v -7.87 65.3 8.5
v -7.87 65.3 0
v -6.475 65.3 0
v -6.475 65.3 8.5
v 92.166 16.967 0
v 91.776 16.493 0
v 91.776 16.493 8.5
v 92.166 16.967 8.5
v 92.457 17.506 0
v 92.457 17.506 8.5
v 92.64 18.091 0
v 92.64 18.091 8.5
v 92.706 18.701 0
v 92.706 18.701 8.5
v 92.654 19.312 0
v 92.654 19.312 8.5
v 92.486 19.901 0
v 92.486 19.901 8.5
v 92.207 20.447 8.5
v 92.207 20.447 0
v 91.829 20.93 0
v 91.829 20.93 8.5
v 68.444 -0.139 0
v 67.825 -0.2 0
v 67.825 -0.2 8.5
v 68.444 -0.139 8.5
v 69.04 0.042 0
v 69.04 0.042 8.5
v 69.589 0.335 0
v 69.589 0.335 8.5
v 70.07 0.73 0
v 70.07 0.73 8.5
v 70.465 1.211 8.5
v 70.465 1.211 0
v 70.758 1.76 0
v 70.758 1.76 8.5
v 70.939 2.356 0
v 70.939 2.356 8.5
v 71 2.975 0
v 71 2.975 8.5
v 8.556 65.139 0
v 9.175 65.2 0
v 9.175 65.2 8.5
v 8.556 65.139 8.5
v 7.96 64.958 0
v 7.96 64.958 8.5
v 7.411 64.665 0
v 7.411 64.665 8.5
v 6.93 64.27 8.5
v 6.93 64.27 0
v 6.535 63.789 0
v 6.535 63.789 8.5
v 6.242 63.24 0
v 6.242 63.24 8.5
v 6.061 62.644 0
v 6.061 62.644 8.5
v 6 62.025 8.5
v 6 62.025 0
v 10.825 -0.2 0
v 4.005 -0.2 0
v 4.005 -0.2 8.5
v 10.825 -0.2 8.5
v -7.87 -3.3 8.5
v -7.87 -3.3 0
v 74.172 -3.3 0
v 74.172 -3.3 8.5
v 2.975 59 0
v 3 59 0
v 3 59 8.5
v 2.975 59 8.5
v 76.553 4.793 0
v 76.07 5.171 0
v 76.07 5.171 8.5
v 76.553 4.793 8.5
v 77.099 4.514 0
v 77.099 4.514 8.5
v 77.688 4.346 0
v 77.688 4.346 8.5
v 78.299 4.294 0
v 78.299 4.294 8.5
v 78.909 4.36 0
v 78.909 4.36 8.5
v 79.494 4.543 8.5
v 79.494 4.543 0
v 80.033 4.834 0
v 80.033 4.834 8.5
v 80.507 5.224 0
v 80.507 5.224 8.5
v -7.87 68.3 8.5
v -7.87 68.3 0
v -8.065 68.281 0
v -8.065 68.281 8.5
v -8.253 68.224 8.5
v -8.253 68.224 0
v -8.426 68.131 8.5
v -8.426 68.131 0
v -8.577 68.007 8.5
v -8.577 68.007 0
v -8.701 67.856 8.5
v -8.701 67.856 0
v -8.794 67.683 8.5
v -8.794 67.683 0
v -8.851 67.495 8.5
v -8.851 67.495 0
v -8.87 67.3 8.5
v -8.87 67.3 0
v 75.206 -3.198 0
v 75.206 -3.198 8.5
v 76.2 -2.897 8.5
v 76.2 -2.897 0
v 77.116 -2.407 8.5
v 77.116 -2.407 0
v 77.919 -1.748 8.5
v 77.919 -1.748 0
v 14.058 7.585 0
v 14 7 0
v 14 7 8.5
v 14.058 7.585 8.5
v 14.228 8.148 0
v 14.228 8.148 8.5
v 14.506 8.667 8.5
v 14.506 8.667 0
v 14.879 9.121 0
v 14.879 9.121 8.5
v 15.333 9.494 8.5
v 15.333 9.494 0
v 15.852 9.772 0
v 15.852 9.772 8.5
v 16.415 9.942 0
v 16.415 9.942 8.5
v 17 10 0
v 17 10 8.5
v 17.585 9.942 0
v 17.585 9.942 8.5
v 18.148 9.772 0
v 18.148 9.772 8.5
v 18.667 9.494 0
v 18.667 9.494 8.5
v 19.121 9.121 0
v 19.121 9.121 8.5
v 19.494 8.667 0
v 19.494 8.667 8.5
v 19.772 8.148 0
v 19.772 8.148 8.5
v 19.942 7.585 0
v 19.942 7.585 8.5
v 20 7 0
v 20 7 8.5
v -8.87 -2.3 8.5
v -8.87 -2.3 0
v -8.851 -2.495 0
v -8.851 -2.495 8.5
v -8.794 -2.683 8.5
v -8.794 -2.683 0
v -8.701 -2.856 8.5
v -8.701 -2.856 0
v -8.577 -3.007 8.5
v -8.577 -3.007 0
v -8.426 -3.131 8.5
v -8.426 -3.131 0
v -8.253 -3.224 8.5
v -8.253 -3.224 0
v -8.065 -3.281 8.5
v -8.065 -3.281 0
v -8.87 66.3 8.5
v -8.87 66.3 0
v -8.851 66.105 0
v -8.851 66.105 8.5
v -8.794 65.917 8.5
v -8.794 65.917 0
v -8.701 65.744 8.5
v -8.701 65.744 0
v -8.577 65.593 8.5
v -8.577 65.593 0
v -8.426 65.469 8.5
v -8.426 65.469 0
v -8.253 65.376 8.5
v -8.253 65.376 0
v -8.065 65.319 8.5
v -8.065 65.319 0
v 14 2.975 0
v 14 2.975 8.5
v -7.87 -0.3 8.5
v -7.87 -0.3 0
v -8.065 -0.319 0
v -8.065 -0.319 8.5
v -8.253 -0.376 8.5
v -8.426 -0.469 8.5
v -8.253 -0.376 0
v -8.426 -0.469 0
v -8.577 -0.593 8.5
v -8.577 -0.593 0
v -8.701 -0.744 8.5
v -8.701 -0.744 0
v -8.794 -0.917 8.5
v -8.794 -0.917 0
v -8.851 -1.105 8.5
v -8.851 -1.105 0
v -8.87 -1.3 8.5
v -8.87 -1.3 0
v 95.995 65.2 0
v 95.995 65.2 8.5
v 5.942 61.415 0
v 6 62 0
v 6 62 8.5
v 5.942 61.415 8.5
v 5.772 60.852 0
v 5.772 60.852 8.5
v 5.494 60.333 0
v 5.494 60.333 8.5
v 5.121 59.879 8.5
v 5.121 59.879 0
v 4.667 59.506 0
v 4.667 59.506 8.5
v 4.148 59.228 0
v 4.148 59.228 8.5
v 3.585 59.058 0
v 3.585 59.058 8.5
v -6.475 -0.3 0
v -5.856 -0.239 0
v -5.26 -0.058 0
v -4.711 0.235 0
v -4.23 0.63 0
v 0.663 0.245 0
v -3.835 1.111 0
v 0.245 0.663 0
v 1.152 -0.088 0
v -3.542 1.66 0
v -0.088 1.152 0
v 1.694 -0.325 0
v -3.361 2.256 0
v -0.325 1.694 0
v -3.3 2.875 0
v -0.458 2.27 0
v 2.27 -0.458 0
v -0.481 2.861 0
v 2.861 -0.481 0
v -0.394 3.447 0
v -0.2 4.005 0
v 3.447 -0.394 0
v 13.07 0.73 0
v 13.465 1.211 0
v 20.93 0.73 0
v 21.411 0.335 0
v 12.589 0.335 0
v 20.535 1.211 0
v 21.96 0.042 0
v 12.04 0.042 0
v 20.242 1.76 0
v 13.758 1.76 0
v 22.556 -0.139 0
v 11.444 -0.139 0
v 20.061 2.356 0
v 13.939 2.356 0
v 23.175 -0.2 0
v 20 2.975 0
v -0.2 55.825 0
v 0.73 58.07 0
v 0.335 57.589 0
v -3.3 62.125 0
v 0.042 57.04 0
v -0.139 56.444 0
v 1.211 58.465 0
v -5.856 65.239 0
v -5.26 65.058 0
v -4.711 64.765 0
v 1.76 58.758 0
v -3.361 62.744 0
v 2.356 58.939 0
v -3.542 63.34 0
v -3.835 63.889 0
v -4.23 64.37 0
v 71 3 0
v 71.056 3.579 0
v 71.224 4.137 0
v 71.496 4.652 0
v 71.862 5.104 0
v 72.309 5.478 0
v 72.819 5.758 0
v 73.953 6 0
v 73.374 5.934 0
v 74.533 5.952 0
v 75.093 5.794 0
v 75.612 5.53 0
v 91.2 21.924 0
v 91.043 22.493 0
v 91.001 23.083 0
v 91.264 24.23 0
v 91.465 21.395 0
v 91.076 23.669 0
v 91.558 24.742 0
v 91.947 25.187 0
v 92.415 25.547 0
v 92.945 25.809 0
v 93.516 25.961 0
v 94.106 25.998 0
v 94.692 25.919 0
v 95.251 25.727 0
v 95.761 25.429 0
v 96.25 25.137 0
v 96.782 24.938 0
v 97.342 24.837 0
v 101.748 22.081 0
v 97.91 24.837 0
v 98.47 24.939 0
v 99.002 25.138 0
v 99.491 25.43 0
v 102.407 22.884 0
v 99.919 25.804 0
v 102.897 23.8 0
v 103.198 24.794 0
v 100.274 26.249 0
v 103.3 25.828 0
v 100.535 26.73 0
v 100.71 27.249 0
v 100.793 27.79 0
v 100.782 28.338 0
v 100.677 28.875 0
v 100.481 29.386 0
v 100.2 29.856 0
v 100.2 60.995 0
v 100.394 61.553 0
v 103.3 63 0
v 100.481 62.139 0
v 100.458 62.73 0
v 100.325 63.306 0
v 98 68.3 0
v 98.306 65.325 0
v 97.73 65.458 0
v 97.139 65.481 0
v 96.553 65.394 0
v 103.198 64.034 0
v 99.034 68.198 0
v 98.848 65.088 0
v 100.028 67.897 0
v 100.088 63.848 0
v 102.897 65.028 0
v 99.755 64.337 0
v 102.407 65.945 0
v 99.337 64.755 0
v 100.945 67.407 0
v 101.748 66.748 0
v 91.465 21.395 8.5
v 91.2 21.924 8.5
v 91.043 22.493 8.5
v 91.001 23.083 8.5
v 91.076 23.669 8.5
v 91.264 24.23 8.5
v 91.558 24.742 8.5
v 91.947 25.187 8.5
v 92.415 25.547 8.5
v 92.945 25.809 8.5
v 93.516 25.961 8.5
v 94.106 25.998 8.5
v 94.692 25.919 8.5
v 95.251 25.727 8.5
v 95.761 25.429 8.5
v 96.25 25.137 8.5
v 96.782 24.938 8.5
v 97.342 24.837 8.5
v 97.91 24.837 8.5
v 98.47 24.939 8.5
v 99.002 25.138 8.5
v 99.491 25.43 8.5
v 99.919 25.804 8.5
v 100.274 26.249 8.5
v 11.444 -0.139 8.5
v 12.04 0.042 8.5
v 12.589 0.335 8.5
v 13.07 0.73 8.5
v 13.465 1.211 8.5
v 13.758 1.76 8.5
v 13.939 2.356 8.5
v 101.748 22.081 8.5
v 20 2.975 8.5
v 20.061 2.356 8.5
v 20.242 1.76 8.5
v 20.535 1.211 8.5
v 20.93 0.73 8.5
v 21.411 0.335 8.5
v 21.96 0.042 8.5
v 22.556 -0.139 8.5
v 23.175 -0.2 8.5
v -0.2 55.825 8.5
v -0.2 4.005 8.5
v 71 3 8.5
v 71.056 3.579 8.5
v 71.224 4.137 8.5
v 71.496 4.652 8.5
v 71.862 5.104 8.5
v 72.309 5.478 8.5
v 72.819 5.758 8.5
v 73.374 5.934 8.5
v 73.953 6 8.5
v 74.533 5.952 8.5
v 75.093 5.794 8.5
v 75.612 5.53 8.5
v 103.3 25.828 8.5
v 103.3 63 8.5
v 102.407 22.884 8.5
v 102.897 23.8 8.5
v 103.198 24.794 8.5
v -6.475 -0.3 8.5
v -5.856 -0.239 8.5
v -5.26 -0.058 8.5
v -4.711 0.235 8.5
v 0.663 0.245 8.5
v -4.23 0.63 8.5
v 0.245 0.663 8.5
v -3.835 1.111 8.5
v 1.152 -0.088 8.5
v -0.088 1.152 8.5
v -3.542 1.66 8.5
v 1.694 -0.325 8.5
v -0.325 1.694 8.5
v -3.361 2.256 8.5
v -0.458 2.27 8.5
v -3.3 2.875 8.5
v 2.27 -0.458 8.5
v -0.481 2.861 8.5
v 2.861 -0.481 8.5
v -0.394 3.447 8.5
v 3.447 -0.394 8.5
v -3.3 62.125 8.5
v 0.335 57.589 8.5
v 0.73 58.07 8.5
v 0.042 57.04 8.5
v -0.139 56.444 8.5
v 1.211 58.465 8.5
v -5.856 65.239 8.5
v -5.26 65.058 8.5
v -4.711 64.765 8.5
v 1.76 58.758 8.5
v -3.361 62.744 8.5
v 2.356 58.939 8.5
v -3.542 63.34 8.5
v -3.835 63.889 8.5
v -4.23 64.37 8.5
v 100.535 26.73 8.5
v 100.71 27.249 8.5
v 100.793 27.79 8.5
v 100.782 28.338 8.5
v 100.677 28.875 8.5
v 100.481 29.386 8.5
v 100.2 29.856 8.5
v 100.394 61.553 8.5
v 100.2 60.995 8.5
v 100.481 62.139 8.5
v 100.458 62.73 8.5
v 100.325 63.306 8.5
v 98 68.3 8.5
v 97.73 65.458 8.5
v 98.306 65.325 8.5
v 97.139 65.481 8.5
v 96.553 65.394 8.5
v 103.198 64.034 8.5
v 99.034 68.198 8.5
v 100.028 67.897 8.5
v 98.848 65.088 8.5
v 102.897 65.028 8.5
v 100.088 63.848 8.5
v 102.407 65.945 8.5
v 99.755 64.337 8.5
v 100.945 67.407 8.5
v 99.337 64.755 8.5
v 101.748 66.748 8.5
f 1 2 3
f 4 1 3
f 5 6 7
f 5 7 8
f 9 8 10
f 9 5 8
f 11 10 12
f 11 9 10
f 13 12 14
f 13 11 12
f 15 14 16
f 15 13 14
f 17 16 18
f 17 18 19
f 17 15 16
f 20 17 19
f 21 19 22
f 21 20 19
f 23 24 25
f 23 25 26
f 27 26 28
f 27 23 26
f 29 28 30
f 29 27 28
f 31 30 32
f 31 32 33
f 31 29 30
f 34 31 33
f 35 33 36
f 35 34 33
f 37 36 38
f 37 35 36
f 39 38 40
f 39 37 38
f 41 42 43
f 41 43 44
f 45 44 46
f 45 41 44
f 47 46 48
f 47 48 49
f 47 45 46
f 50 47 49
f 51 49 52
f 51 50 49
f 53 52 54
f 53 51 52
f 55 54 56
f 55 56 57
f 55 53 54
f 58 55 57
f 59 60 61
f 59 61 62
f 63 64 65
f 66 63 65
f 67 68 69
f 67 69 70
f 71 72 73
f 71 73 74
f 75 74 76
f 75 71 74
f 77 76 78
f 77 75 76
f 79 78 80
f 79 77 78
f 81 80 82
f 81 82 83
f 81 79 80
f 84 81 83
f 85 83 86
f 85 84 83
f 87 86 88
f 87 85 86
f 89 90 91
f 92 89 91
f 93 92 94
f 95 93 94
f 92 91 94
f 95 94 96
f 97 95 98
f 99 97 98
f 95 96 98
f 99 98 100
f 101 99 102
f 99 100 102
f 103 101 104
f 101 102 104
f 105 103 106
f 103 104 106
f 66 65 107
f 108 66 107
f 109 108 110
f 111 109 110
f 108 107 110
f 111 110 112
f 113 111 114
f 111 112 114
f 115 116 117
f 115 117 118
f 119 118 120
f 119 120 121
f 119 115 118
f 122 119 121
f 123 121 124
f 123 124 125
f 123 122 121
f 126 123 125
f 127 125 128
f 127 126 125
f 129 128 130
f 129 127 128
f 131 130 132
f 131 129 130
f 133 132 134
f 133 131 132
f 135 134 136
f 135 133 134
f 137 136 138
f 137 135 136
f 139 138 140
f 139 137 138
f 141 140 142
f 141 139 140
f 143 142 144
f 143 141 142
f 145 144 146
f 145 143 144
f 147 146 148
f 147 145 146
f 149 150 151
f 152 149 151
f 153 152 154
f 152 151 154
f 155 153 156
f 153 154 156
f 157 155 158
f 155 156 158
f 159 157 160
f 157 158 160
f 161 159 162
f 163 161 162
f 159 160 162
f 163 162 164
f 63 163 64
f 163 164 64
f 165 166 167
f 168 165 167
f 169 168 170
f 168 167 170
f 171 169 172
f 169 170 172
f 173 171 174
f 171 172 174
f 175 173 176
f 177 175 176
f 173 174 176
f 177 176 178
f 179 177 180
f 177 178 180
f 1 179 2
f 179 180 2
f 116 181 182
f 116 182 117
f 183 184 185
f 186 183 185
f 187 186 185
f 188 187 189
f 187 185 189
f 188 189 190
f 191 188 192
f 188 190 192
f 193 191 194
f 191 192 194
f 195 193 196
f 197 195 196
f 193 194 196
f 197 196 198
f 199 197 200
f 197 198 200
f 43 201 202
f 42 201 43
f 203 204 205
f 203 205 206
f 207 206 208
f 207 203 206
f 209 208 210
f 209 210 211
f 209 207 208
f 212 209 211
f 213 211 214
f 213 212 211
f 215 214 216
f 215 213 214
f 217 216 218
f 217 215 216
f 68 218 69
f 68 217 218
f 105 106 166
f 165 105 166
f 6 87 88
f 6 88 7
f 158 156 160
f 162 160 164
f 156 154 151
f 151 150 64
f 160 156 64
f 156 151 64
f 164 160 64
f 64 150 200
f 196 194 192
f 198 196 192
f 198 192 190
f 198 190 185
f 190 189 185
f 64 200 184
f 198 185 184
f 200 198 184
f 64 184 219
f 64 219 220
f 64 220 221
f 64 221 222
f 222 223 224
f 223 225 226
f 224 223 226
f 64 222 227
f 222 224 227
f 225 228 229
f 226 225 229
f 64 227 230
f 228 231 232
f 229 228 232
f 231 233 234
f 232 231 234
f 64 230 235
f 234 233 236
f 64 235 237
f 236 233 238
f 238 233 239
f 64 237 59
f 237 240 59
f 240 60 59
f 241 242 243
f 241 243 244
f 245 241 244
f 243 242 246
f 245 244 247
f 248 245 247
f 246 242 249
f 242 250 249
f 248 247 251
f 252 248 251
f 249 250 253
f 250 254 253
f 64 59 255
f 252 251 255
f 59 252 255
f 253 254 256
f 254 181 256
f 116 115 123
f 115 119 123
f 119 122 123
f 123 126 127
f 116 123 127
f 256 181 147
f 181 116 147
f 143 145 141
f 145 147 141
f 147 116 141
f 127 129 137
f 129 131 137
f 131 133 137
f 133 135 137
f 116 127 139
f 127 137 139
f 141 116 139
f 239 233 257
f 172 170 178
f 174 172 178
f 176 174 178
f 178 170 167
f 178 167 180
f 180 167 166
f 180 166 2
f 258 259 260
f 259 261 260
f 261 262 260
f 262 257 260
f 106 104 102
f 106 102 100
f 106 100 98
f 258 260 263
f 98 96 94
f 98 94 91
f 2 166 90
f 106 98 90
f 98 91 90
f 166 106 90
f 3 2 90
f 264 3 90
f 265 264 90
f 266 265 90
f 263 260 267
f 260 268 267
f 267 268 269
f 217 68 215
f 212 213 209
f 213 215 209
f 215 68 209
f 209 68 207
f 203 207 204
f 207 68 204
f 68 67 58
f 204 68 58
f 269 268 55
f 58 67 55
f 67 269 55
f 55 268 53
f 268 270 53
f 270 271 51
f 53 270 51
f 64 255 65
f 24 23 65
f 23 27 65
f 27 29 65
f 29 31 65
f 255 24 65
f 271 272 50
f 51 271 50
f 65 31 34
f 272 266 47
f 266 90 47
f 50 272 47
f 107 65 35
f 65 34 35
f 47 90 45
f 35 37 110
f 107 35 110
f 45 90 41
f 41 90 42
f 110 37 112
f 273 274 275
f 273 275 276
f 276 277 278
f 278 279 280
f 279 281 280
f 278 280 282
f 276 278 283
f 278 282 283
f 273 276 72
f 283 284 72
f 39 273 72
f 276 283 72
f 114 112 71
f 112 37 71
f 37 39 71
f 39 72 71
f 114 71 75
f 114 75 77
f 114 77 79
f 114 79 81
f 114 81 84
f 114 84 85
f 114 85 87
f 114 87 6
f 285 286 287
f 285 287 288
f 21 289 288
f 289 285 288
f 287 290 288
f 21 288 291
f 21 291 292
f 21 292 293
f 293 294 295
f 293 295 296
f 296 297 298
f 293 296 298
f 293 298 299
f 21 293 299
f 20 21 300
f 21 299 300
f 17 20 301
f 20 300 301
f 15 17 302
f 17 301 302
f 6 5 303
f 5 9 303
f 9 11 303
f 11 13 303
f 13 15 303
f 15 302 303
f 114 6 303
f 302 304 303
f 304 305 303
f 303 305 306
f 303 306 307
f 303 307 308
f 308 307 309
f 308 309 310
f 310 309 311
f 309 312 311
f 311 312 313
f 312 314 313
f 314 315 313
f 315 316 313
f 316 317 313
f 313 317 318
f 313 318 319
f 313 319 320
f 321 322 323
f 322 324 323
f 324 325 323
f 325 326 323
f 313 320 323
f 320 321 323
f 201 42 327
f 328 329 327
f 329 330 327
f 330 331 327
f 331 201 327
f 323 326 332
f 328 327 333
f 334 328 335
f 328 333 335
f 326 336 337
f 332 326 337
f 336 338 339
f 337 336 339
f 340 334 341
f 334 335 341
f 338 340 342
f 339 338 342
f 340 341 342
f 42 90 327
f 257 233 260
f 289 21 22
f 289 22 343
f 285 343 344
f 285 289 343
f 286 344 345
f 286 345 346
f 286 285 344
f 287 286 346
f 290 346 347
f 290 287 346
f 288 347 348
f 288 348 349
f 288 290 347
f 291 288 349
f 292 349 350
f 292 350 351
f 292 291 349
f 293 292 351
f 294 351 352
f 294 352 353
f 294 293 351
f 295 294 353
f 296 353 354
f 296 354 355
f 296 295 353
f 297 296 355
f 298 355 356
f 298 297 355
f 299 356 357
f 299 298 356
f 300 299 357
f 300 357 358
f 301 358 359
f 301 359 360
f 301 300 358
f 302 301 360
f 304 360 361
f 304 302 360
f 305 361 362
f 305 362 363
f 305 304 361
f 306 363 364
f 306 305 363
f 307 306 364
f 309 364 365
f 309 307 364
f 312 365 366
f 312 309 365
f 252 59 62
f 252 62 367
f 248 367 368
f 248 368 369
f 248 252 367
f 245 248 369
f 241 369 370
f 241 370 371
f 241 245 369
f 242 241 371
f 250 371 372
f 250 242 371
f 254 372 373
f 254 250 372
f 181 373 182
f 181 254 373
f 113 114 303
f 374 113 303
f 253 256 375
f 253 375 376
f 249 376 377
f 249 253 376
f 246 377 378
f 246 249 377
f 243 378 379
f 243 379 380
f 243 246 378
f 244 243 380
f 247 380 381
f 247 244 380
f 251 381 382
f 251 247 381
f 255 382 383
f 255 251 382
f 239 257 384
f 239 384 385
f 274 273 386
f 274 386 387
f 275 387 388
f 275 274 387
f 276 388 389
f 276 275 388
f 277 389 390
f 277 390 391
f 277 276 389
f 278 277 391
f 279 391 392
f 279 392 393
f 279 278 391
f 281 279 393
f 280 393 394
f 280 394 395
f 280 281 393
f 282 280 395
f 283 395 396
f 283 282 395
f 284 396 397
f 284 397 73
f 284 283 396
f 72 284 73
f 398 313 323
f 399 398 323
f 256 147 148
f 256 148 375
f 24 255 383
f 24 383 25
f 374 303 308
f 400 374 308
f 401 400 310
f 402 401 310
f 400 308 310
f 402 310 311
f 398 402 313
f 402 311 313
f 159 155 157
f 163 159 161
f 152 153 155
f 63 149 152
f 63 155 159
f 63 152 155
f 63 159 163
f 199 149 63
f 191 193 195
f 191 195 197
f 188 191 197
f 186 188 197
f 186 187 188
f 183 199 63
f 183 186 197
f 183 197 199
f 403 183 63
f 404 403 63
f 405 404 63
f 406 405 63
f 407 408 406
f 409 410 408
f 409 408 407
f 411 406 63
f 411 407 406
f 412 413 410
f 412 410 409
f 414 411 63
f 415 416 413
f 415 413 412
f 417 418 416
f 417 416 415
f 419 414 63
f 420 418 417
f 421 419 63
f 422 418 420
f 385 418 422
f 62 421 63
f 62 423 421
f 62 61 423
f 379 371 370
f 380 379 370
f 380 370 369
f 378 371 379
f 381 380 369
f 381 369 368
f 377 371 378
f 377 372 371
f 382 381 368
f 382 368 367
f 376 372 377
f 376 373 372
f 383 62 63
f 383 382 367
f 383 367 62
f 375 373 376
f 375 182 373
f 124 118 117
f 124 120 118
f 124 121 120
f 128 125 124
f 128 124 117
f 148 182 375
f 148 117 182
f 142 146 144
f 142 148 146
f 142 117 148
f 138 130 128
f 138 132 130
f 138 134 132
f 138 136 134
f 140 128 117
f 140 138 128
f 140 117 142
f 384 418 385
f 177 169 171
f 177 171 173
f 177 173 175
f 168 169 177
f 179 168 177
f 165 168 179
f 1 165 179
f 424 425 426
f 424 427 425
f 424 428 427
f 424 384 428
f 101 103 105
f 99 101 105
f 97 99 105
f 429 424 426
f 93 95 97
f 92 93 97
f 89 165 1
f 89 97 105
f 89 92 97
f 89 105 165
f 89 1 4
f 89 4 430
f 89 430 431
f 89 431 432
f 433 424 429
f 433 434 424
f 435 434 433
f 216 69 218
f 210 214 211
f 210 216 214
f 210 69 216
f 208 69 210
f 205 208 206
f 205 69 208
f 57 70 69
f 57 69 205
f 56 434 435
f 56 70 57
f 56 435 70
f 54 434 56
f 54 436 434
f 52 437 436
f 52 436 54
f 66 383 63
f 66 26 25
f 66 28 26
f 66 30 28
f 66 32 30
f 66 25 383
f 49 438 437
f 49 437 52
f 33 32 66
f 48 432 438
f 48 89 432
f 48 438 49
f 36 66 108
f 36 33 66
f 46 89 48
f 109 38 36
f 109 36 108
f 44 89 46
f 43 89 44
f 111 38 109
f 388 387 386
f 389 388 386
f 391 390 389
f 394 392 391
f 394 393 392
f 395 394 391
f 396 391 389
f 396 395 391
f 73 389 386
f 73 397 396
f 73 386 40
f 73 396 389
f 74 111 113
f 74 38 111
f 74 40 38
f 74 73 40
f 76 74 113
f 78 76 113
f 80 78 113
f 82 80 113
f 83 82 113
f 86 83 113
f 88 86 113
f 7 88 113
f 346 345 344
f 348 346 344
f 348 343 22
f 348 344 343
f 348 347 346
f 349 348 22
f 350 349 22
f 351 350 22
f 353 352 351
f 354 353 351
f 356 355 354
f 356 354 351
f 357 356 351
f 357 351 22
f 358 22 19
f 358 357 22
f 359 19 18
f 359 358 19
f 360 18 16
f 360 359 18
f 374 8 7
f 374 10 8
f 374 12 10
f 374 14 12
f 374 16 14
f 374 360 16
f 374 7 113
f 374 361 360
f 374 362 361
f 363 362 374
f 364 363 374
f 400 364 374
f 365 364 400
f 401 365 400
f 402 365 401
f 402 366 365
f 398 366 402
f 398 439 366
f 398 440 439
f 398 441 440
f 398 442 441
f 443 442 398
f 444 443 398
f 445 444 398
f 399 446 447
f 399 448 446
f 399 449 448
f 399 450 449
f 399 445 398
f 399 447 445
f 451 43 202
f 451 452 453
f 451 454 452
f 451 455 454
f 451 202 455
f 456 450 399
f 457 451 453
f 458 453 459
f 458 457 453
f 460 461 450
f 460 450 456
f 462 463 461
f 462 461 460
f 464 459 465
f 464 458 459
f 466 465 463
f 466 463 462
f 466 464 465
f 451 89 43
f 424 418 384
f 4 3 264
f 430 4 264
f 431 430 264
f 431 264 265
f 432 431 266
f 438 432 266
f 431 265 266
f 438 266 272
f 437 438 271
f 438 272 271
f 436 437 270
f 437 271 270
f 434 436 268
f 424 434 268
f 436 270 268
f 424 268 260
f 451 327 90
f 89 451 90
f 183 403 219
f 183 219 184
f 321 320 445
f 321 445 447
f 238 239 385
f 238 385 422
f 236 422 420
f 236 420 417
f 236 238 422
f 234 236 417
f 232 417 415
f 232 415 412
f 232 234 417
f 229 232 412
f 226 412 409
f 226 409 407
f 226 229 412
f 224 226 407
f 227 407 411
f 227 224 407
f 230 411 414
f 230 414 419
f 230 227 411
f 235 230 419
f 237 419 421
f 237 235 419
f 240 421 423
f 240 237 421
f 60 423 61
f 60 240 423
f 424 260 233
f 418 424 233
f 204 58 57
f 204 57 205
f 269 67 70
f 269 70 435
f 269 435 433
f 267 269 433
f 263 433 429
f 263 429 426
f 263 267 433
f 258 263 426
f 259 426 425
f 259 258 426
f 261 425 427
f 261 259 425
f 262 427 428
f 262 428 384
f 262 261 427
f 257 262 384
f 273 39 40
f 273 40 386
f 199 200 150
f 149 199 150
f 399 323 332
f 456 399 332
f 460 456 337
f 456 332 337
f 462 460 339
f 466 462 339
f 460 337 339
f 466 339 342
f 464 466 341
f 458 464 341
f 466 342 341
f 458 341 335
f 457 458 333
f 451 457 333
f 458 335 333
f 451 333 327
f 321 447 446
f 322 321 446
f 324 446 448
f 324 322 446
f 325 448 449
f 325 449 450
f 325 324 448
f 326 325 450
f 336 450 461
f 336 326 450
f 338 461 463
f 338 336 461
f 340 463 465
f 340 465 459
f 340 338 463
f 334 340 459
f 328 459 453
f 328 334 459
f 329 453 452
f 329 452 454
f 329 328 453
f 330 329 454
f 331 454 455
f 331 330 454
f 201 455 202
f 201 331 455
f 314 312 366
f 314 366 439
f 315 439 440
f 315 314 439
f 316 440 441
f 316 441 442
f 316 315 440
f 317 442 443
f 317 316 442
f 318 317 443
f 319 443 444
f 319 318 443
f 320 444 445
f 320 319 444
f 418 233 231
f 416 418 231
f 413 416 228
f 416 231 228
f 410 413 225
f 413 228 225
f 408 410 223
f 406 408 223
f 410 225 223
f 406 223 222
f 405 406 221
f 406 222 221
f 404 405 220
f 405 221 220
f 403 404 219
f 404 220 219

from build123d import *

# Parameters (mm, degrees)
BOSS_EXTRUDE1_DEPTH = 8.5


with BuildPart() as part:
    # Sketch1 → Boss-Extrude1 (new body)
    with BuildSketch(Plane.XY):
        with BuildLine():
            Line((-8.87, -1.3), (-8.87, -2.3))
            ThreePointArc((-8.87, -2.3), (-8.577106781, -3.007106781), (-7.87, -3.3))
            Line((-7.87, -3.3), (74.171572667, -3.3))
            ThreePointArc((74.171572667, -3.3), (76.199795144, -2.896561433), (77.919239112, -1.747665644))
            Line((77.919239112, -1.747665644), (101.747665711, 22.080760955))
            ThreePointArc((101.747665711, 22.080760955), (102.896561433, 23.800204856), (103.3, 25.828427238))
            Line((103.3, 25.828427238), (103.3, 63))
            ThreePointArc((103.3, 63), (101.74766594, 66.74766594), (98, 68.3))
            Line((98, 68.3), (-7.87, 68.3))
            ThreePointArc((-7.87, 68.3), (-8.577106781, 68.007106781), (-8.87, 67.3))
            Line((-8.87, 67.3), (-8.87, 66.3))
            ThreePointArc((-8.87, 66.3), (-8.577106781, 65.592893219), (-7.87, 65.3))
            Line((-7.87, 65.3), (-6.475, 65.3))
            ThreePointArc((-6.475, 65.3), (-4.22993597, 64.37006403), (-3.3, 62.125))
            Line((-3.3, 62.125), (-3.3, 2.875))
            ThreePointArc((-3.3, 2.875), (-4.22993597, 0.62993597), (-6.475, -0.3))
            Line((-6.475, -0.3), (-7.87, -0.3))
            ThreePointArc((-7.87, -0.3), (-8.577106781, -0.592893219), (-8.87, -1.3))
        make_face()
        with BuildLine():
            Line((100.2, 29.856417462), (100.2, 60.994582891))
            ThreePointArc((100.2, 60.994582891), (99.555634919, 64.555634919), (95.994582891, 65.2))
            Line((95.994582891, 65.2), (9.175, 65.2))
            ThreePointArc((9.175, 65.2), (6.92993597, 64.27006403), (6, 62.025))
            Line((6, 62.025), (6, 62))
            ThreePointArc((6, 62), (5.121320344, 59.878679656), (3, 59))
            Line((3, 59), (2.975, 59))
            ThreePointArc((2.975, 59), (0.72993597, 58.07006403), (-0.2, 55.825))
            Line((-0.2, 55.825), (-0.2, 4.005417109))
            ThreePointArc((-0.2, 4.005417109), (0.444365081, 0.444365081), (4.005417109, -0.2))
            Line((4.005417109, -0.2), (10.825, -0.2))
            ThreePointArc((10.825, -0.2), (13.07006403, 0.72993597), (14, 2.975))
            Line((14, 2.975), (14, 7))
            ThreePointArc((14, 7), (17, 10), (20, 7))
            Line((20, 7), (20, 2.975))
            ThreePointArc((20, 2.975), (20.92993597, 0.72993597), (23.175, -0.2))
            Line((23.175, -0.2), (67.825, -0.2))
            ThreePointArc((67.825, -0.2), (70.07006403, 0.72993597), (71, 2.975))
            Line((71, 2.975), (71, 3))
            ThreePointArc((71, 3), (72.819133757, 5.757817056), (76.070369945, 5.171075377))
            ThreePointArc((76.070369945, 5.171075377), (78.299195815, 4.294020465), (80.5065755, 5.223732787))
            Line((80.5065755, 5.223732787), (91.776267213, 16.4934245))
            ThreePointArc((91.776267213, 16.4934245), (92.705979535, 18.700804185), (91.828924623, 20.929630055))
            ThreePointArc((91.828924623, 20.929630055), (91.741164129, 24.974249353), (95.761133603, 25.428663919))
            ThreePointArc((95.761133603, 25.428663919), (98.192543935, 24.875137086), (100.273869597, 26.248538573))
            ThreePointArc((100.273869597, 26.248538573), (100.79933472, 28.063992887), (100.2, 29.856417462))
        make_face(mode=Mode.SUBTRACT)
    extrude(amount=BOSS_EXTRUDE1_DEPTH)


solid = part.part
